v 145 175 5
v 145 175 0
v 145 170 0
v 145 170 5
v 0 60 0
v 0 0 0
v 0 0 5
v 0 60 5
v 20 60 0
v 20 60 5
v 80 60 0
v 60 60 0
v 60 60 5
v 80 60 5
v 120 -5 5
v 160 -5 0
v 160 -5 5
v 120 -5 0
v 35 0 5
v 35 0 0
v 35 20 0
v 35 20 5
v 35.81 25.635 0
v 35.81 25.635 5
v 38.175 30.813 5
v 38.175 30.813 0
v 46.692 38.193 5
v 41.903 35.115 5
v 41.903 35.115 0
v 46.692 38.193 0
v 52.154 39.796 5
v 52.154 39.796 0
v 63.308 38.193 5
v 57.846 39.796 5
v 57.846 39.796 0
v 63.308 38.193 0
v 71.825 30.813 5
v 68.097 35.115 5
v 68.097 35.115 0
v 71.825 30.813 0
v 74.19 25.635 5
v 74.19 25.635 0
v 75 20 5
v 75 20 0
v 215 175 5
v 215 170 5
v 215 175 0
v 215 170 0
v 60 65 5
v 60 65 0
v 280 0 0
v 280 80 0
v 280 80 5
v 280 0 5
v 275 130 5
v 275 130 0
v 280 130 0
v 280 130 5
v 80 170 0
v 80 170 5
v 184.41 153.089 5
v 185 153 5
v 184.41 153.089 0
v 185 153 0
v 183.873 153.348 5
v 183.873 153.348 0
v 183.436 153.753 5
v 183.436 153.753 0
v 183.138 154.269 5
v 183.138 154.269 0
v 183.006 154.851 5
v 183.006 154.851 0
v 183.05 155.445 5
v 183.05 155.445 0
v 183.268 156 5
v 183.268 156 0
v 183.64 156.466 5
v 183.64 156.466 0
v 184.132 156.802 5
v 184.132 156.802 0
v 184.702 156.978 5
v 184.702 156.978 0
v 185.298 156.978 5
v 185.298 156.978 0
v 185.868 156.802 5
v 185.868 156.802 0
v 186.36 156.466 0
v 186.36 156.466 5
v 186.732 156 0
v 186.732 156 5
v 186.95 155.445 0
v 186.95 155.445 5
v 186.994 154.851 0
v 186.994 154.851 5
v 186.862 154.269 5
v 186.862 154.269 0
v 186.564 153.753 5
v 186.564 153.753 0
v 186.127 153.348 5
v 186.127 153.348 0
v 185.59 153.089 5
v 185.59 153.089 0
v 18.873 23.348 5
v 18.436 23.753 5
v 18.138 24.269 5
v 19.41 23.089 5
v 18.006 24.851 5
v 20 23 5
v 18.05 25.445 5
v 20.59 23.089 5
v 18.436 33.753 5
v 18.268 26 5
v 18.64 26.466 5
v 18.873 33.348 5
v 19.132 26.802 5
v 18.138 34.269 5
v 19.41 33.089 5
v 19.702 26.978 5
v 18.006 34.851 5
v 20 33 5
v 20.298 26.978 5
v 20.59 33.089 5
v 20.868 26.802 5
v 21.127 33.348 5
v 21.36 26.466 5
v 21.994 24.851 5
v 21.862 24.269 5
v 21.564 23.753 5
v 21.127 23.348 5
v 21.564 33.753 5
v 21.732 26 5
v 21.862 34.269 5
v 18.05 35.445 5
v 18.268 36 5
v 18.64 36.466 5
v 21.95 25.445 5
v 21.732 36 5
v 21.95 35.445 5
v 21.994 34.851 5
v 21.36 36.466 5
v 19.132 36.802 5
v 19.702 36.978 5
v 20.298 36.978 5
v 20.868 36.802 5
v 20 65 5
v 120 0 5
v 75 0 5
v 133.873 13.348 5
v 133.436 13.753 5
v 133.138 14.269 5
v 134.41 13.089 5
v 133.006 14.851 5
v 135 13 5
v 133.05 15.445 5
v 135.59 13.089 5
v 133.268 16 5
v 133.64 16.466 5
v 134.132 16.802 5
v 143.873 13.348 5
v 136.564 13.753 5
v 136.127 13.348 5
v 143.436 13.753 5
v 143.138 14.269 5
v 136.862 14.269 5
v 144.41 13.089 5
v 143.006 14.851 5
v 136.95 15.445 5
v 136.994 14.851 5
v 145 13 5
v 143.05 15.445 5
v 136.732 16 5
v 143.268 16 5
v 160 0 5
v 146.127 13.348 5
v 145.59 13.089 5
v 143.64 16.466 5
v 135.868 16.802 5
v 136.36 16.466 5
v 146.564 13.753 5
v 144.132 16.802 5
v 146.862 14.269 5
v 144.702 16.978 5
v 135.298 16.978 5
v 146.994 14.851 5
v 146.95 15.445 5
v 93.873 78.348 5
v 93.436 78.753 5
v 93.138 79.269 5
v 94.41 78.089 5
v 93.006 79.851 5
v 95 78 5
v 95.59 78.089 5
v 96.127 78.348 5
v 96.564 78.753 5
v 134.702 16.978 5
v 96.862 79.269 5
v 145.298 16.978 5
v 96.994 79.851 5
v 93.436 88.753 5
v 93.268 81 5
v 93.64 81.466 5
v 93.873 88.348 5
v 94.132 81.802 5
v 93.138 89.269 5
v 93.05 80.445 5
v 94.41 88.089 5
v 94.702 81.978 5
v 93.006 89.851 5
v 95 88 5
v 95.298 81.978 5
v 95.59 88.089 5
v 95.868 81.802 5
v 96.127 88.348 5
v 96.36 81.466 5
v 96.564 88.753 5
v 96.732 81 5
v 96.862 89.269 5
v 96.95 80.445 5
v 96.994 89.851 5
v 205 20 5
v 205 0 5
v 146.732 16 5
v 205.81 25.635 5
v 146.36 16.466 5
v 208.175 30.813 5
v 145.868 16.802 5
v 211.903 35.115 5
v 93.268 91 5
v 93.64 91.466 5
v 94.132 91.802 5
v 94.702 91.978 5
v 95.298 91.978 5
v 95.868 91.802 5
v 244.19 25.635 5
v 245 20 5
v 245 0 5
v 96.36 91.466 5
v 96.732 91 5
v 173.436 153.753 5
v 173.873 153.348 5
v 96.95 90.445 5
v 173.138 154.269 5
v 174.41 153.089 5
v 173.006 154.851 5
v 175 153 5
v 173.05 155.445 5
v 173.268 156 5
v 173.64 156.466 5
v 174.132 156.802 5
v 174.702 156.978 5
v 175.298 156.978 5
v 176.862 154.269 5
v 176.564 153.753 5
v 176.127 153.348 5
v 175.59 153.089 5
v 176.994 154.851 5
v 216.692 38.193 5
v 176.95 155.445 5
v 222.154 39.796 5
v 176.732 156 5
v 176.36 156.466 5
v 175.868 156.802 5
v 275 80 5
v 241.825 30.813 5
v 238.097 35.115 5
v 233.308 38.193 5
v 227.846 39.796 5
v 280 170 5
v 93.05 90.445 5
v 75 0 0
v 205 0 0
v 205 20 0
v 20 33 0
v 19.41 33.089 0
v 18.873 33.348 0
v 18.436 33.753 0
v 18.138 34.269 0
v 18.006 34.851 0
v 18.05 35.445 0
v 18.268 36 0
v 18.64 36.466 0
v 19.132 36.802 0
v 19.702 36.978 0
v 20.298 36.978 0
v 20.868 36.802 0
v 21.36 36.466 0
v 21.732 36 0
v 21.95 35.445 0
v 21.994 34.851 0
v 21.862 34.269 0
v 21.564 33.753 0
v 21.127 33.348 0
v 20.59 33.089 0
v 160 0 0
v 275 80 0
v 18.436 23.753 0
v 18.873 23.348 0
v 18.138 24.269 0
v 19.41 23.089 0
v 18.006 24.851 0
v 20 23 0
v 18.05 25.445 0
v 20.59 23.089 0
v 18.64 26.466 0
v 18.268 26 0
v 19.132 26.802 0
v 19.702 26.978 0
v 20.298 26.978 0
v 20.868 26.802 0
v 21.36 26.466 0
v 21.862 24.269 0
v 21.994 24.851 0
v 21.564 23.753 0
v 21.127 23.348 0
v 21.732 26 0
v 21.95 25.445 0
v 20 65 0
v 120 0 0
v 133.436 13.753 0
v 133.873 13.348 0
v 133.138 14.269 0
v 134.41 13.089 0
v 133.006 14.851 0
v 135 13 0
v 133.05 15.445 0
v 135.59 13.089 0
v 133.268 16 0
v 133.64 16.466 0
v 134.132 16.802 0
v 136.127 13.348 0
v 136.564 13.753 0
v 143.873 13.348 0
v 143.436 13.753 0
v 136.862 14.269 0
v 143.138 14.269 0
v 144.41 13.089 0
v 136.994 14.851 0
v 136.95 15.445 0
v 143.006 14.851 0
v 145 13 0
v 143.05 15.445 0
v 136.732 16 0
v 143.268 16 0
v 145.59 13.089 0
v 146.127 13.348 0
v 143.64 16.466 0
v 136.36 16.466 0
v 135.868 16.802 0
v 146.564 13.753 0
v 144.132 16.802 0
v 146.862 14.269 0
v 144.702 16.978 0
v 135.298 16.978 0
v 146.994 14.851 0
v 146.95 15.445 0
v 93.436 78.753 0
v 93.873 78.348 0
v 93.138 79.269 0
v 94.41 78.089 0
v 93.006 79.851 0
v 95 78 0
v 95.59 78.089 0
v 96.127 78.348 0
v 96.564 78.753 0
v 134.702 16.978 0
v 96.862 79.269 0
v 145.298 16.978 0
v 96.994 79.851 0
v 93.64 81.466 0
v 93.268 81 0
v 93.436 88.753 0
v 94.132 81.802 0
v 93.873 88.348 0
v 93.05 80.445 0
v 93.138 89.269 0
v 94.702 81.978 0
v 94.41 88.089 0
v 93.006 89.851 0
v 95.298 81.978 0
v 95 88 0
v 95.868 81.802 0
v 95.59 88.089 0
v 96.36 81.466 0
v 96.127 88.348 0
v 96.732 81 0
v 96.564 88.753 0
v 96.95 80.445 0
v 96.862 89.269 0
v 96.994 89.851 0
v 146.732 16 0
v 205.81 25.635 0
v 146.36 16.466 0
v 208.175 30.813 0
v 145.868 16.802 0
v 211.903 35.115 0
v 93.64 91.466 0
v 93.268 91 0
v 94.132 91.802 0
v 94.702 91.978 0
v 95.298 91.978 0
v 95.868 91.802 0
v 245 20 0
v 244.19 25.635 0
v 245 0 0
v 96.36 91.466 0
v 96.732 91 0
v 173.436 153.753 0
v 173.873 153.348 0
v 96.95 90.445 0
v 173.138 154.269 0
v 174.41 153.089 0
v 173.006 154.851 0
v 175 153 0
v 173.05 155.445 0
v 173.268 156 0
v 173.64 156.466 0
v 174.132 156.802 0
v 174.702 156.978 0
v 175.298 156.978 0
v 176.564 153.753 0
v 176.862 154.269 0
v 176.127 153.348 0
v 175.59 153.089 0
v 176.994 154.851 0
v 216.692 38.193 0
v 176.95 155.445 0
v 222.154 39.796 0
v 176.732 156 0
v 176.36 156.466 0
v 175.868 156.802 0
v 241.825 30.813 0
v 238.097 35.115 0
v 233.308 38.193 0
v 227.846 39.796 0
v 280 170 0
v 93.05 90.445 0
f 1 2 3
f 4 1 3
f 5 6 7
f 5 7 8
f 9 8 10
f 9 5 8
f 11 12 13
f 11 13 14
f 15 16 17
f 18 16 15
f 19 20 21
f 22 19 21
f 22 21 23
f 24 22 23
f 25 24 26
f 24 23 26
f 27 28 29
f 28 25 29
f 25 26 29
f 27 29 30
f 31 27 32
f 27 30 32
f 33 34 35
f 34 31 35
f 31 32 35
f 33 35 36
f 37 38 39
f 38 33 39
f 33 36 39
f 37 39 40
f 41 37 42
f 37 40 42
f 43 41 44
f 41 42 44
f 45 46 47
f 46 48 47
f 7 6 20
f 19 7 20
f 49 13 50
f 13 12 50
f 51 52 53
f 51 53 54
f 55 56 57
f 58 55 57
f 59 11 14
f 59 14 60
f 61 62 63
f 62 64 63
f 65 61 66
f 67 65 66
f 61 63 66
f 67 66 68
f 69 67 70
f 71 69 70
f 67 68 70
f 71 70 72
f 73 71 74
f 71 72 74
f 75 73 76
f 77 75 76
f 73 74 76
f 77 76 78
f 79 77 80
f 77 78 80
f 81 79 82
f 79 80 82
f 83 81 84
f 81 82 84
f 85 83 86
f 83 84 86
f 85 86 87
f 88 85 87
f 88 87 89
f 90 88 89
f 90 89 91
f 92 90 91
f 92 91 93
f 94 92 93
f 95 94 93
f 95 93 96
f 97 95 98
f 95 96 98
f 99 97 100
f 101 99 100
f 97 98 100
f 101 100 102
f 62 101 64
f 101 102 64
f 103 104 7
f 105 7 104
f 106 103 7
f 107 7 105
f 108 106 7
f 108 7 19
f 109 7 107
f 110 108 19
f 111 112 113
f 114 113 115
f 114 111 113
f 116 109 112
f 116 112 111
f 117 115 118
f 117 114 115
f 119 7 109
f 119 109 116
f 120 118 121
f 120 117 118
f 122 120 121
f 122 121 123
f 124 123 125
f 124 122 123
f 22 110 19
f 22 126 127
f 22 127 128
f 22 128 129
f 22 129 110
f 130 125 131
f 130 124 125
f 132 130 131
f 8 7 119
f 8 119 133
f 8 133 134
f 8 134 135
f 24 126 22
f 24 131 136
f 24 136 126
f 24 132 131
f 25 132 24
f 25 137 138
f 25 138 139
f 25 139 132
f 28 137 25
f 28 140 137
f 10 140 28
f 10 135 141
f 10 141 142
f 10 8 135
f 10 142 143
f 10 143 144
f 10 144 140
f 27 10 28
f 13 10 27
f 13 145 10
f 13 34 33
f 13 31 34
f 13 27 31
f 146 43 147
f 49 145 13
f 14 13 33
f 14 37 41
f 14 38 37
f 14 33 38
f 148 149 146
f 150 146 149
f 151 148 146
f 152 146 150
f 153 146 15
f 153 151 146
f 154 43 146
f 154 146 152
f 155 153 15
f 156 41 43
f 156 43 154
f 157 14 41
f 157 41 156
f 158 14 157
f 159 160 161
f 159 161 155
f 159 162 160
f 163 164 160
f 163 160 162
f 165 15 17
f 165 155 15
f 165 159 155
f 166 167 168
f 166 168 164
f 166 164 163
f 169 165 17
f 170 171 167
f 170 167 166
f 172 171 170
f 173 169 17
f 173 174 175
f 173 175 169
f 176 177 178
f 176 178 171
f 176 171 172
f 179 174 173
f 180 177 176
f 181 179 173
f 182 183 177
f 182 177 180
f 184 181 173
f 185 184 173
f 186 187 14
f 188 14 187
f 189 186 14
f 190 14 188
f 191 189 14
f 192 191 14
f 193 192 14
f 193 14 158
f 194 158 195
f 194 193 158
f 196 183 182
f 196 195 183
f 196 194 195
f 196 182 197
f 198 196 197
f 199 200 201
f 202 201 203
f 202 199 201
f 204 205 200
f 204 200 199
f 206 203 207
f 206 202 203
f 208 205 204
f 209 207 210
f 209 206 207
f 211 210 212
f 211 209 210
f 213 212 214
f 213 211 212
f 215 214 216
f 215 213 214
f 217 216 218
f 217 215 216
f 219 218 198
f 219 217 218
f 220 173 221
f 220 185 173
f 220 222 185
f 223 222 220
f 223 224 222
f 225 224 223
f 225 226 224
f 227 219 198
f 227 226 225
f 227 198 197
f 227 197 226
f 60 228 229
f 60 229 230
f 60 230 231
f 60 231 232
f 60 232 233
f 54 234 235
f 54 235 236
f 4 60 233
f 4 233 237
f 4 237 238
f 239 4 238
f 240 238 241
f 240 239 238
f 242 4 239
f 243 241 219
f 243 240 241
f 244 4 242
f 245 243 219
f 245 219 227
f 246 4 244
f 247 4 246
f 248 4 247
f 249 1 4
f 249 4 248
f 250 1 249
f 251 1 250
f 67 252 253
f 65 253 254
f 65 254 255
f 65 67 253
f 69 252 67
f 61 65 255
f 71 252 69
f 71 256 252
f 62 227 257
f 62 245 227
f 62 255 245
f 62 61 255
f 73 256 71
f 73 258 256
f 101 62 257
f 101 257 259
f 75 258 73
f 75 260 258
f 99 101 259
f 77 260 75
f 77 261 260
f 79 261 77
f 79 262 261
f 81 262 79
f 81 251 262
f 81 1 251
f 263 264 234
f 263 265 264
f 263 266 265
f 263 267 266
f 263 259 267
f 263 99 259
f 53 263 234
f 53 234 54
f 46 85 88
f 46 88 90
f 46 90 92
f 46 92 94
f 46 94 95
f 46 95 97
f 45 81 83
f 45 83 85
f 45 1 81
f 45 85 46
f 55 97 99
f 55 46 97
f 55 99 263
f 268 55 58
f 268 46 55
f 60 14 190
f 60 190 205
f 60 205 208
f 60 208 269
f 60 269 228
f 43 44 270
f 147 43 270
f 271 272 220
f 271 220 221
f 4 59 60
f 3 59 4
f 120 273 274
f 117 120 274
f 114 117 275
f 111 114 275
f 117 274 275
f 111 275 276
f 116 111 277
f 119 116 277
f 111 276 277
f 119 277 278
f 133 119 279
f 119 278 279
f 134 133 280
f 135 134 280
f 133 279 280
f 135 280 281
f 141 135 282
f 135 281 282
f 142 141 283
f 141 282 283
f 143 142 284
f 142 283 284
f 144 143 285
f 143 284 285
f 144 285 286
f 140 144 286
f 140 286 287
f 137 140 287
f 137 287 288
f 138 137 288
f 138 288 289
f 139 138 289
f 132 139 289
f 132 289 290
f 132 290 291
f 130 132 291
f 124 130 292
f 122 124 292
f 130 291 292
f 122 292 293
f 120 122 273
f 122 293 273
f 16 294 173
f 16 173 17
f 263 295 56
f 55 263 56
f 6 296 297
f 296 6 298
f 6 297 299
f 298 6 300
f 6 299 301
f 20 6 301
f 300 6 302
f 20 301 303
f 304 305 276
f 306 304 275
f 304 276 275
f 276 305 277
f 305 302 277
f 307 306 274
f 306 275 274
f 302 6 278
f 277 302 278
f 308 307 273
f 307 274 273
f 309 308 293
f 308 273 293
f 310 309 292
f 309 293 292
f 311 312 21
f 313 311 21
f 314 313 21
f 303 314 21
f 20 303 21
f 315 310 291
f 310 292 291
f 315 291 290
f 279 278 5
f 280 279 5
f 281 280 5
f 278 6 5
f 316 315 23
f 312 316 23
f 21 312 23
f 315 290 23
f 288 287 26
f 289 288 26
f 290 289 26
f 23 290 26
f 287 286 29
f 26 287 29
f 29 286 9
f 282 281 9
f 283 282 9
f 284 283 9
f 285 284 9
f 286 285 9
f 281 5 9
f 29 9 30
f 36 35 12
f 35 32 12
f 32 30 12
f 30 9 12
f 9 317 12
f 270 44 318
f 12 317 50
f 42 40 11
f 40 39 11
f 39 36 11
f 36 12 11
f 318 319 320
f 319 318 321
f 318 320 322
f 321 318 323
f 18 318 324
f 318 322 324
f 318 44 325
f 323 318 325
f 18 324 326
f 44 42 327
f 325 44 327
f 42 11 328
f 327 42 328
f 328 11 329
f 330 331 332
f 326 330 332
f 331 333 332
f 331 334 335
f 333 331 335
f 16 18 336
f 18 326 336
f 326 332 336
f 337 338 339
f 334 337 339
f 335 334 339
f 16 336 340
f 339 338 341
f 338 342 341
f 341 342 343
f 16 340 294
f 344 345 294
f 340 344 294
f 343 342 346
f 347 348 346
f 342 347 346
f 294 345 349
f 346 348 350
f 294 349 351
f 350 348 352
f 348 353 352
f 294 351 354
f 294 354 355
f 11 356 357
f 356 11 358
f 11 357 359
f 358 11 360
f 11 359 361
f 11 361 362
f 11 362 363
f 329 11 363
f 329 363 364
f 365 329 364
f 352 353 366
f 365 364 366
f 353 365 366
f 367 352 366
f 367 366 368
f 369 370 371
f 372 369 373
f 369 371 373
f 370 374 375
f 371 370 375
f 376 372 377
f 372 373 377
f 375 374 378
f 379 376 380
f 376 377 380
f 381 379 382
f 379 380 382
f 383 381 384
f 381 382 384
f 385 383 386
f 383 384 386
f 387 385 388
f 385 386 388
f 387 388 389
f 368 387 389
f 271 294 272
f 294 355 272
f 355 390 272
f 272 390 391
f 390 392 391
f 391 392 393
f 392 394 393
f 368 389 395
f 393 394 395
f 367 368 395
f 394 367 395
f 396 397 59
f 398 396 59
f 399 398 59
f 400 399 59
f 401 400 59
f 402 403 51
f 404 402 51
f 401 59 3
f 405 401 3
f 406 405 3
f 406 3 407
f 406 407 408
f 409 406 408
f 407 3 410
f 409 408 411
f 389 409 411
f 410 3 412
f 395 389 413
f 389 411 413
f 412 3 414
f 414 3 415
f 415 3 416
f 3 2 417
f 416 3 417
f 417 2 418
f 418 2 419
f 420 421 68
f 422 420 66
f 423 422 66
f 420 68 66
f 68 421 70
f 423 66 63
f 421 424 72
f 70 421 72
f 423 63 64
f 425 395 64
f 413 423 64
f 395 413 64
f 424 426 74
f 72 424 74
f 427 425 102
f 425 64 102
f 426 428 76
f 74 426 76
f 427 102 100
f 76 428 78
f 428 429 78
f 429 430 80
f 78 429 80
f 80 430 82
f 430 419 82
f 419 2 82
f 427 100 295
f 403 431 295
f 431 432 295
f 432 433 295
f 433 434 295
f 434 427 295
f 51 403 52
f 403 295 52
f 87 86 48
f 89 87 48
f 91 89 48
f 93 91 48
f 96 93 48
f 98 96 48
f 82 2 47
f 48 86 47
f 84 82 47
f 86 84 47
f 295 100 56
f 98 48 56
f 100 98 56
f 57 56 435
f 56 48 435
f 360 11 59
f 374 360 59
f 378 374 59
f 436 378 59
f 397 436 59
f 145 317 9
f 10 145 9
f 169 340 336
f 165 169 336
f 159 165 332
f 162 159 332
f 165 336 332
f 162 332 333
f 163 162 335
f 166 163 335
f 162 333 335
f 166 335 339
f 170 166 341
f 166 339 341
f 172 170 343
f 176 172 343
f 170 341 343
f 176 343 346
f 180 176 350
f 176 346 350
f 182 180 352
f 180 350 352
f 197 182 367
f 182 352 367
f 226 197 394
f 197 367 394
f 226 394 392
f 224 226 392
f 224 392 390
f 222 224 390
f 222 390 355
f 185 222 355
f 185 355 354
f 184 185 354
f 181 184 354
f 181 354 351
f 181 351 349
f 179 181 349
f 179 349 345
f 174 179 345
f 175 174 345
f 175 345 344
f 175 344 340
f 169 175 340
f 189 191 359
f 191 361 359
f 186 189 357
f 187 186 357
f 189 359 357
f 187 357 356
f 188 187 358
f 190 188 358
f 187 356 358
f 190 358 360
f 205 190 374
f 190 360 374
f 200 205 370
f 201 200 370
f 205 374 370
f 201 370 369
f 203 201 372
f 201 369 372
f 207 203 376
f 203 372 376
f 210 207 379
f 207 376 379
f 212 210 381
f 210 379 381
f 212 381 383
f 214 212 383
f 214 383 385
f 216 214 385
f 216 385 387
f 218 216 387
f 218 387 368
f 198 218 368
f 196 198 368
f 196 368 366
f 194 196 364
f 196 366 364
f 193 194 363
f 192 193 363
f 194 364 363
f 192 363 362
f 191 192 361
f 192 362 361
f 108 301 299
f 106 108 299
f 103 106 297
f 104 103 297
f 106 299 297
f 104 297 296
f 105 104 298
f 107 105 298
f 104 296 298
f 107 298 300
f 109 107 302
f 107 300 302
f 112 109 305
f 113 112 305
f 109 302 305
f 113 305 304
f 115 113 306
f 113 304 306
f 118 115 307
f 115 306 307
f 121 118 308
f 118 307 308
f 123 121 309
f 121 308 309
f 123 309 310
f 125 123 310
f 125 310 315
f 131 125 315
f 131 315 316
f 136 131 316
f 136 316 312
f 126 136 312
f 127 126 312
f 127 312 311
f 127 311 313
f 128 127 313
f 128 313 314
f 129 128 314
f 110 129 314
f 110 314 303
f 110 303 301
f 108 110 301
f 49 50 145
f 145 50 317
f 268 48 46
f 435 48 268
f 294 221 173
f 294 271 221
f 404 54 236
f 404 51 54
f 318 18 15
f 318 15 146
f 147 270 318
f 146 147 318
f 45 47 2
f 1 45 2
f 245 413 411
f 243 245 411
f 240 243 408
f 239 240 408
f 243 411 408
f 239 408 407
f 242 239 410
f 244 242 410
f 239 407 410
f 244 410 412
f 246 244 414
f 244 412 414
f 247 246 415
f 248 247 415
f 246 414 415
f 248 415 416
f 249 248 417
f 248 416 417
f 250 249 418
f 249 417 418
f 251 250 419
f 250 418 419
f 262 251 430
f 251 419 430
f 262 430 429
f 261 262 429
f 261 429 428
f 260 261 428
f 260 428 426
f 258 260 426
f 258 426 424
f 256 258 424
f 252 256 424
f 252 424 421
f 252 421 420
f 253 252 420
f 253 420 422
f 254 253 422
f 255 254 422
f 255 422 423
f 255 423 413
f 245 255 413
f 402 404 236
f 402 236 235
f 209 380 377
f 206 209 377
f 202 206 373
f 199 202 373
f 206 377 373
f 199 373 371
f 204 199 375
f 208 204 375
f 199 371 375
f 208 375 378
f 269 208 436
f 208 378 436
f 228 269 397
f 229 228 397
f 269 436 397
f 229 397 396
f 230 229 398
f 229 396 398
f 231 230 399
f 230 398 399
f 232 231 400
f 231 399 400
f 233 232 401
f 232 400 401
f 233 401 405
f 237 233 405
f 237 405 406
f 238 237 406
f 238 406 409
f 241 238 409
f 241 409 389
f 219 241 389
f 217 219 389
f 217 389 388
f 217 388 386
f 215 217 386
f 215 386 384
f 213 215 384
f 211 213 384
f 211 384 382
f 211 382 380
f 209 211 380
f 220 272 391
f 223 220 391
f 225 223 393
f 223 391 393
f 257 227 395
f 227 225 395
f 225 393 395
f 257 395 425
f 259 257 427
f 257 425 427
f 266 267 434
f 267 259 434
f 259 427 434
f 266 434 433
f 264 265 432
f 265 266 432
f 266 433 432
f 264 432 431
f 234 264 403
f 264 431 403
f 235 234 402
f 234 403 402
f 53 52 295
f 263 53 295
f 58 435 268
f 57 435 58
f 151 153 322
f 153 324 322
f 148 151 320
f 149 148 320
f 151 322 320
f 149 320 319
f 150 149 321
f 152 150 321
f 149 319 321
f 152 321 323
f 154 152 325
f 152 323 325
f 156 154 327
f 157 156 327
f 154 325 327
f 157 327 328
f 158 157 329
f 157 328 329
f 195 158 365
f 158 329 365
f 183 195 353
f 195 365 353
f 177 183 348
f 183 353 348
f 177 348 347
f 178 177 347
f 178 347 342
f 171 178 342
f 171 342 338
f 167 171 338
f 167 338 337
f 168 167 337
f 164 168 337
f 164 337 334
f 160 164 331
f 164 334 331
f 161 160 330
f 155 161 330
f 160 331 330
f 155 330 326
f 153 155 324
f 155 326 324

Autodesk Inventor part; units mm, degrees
ref_plane "YZ Plane" through (0, 0, 0) normal (1, 0, 0) x (0, 1, 0)
ref_plane "XZ Plane" through (0, 0, 0) normal (0, 1, 0) x (-1, 0, 0)
ref_plane "XY Plane" through (0, 0, 0) normal (0, 0, 1) x (1, 0, 0)
sketch "Sketch1" plane through (0, 0, 0) normal (0, 0, 1) x (1, 0, 0)
  line L0 (0, 0) -> (0, 60)
  line L1 (0, 60) -> (80, 60)
  line L2 (80, 60) -> (80, 170)
  line L3 (80, 170) -> (280, 170)
  line L4 (280, 170) -> (280, 0)
  line L5 (0, 0) -> (35, 0)
  line L6 (35, 0) -> (35, 20)
  arc A0 (75, 20) -> (35, 20) centre (55, 20) ccw
  line L7 (75, 20) -> (75, 0)
  line L8 (140, 0) -> (140, 170) construction
  line L9 (75, 0) -> (140, 0)
  line L10 (280, 0) -> (245, 0)
  line L11 (245, 0) -> (245, 20)
  arc A1 (245, 20) -> (205, 20) centre (225, 20) ccw
  line L12 (205, 20) -> (205, 0)
  line L13 (205, 0) -> (140, 0)
  line L14 (145, 170) -> (215, 170)
  line L15 (215, 170) -> (215, 175)
  line L16 (215, 175) -> (145, 175)
  line L17 (145, 175) -> (145, 170)
  line L18 (280, 80) -> (275, 80)
  line L19 (275, 80) -> (275, 130)
  line L20 (275, 130) -> (280, 130)
  line L21 (280, 130) -> (280, 80)
  line L22 (10, 20) -> (15, 20)
  line L23 (15, 20) -> (15, 60)
  line L24 (15, 60) -> (10, 60)
  line L25 (10, 60) -> (10, 20)
  line L26 (20, 60) -> (60, 60)
  line L27 (60, 60) -> (60, 65)
  line L28 (60, 65) -> (20, 65)
  line L29 (20, 65) -> (20, 60)
  line L30 (160, 0) -> (160, -5)
  line L31 (160, -5) -> (120, -5)
  line L32 (120, -5) -> (120, 0)
  dimension "d0" = 60
  dimension "d2" = 110
  dimension "d5" = 20
  dimension "d6" = 40
  dimension "d7" = 70
  dimension "d8" = 5
  dimension "d9" = 5
  dimension "d10" = 50
  dimension "d13" = 5
  dimension "d14" = 40
  dimension "d17" = 40
  dimension "d18" = 5
  dimension "d19" = 40
  dimension "d20" = 5
  dimension "d21" = 20
  dimension "d22" = 0
  dimension "d23" = 170
  dimension "d27" = 35
  dimension "d28" = 80
extrude "Extrusion1" add sketch "Sketch1" along normal blind 5 contours L0 L1 L25 L22 L23 L2 L3 L4 L20 L19 L18 L10 L11 A1 L12 L13 L9 L7 A0 L6 L5 | L1 L23 L22 L25 | L29 L28 L27 L1 | L9 L13 L30 L31 L32 | L17 L16 L15 L3
sketch "Sketch2" plane through (0, 0, 5) normal (0, 0, 1) x (1, 0, 0)
  line L0 (215, 175) -> (145, 175) projected
  line L1 (145, 175) -> (145, 170) projected
  line L2 (120, -5) -> (160, -5) projected
  line L3 (160, -5) -> (160, 0) projected
  line L4 (0, 60) -> (0, 0) projected
  line L5 (20, 60) -> (0, 60) projected
  point P0 (175, 155)
  point P1 (185, 155)
  point P2 (135, 15)
  point P3 (145, 15)
  point P4 (20, 35)
  point P5 (20, 25)
  dimension "d43" = 10
  dimension "d44" = 20
  dimension "d45" = 20
  dimension "d46" = 30
  dimension "d47" = 20
  dimension "d48" = 20
  dimension "d49" = 10
  dimension "d50" = 15
  dimension "d51" = 10
  dimension "d52" = 20
  dimension "d53" = 20
  dimension "d54" = 25
hole "Hole1" at (175, 155, 5) at (185, 155, 5) at (135, 15, 5) at (145, 15, 5) at (20, 35, 5) at (20, 25, 5) direction (0, 0, -1) diameter 4 end through all
sketch "Sketch4" plane through (0, 0, 5) normal (0, 0, 1) x (1, 0, 0)
  line L0 (80, 170) -> (80, 60) projected
  line L1 (80, 60) -> (60, 60) projected
  point P0 (0, 0)
  point P1 (95, 80)
  point P2 (95, 90)
  dimension "d63" = 15
  dimension "d64" = 15
  dimension "d65" = 10
  dimension "d66" = 20
hole "Hole3" at (95, 80, 5) at (95, 90, 5) direction (0, 0, -1) diameter 4 end through all
properties part number "side"
